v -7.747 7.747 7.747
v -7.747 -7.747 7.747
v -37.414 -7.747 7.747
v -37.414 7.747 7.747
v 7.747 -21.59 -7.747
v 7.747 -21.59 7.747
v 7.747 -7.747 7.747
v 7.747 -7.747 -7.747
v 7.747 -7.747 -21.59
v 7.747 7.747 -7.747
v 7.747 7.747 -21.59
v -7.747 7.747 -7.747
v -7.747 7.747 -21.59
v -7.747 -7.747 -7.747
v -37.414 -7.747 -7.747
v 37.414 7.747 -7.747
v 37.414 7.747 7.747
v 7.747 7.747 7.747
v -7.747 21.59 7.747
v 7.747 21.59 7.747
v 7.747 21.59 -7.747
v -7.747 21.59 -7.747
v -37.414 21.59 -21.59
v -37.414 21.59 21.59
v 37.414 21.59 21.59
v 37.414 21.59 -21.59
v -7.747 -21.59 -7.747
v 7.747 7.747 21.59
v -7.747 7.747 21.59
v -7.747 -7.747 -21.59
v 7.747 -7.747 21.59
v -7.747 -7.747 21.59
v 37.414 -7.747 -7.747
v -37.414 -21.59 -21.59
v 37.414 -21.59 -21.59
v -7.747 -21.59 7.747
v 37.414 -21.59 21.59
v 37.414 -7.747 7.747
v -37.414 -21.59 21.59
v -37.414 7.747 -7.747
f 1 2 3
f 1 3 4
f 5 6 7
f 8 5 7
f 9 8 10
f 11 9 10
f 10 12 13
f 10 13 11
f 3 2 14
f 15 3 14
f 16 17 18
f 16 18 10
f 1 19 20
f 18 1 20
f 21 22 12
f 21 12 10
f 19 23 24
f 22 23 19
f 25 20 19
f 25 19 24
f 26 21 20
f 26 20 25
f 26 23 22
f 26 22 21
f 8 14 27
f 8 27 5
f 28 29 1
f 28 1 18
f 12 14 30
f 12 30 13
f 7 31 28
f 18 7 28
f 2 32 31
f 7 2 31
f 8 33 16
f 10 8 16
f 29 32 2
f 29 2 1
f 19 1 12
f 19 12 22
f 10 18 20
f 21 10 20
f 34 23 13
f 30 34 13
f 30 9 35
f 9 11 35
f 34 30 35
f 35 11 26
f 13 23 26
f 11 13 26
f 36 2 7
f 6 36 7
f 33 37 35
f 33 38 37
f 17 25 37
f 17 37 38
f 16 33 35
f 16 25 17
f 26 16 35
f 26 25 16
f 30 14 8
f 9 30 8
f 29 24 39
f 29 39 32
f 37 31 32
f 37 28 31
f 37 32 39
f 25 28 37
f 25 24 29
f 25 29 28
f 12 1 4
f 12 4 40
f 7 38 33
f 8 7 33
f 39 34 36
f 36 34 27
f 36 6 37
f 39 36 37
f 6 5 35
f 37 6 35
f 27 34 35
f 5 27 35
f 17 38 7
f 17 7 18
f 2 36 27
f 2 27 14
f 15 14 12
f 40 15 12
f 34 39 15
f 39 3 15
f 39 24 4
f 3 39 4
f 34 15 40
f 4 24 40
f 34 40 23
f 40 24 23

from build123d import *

# Parameters (mm, degrees)
SKETCH1_W           = 74.8284
SKETCH1_H           = 43.18
BOSS_EXTRUDE1_DEPTH = 21.59
SKETCH12_W          = 15.494
SKETCH12_H          = 15.494
CUT_EXTRUDE1_DEPTH  = 62.077515189
SKETCH15_W          = 15.494
SKETCH15_H          = 15.494
CUT_EXTRUDE2_DEPTH  = 62.077515189
SKETCH16_W          = 15.494
SKETCH16_H          = 15.494
CUT_EXTRUDE3_DEPTH  = 81.817978486


with BuildPart() as part:
    # Sketch1 → Boss-Extrude1 (new, symmetric)
    with BuildSketch(Plane(origin=(0, 0, 0), x_dir=(1, 0, 0), z_dir=(0, 1, 0))):
        Rectangle(SKETCH1_W, SKETCH1_H)
    extrude(amount=BOSS_EXTRUDE1_DEPTH, both=True)

    # Sketch12 → Cut-Extrude1 (cut, through all)
    with BuildSketch(Plane(origin=(0, 21.59, 0), x_dir=(1, 0, 0), z_dir=(0, 1, 0))):
        Rectangle(SKETCH12_W, SKETCH12_H)
    extrude(amount=-CUT_EXTRUDE1_DEPTH, mode=Mode.SUBTRACT)

    # Sketch15 → Cut-Extrude2 (cut, through all)
    with BuildSketch(Plane.XY.offset(21.59)):
        Rectangle(SKETCH15_W, SKETCH15_H)
    extrude(amount=-CUT_EXTRUDE2_DEPTH, mode=Mode.SUBTRACT)

    # Sketch16 → Cut-Extrude3 (cut, through all)
    with BuildSketch(Plane(origin=(37.4142, 0, 0), x_dir=(0, 0, -1), z_dir=(1, 0, 0))):
        Rectangle(SKETCH16_W, SKETCH16_H)
    extrude(amount=-CUT_EXTRUDE3_DEPTH, mode=Mode.SUBTRACT)


solid = part.part
